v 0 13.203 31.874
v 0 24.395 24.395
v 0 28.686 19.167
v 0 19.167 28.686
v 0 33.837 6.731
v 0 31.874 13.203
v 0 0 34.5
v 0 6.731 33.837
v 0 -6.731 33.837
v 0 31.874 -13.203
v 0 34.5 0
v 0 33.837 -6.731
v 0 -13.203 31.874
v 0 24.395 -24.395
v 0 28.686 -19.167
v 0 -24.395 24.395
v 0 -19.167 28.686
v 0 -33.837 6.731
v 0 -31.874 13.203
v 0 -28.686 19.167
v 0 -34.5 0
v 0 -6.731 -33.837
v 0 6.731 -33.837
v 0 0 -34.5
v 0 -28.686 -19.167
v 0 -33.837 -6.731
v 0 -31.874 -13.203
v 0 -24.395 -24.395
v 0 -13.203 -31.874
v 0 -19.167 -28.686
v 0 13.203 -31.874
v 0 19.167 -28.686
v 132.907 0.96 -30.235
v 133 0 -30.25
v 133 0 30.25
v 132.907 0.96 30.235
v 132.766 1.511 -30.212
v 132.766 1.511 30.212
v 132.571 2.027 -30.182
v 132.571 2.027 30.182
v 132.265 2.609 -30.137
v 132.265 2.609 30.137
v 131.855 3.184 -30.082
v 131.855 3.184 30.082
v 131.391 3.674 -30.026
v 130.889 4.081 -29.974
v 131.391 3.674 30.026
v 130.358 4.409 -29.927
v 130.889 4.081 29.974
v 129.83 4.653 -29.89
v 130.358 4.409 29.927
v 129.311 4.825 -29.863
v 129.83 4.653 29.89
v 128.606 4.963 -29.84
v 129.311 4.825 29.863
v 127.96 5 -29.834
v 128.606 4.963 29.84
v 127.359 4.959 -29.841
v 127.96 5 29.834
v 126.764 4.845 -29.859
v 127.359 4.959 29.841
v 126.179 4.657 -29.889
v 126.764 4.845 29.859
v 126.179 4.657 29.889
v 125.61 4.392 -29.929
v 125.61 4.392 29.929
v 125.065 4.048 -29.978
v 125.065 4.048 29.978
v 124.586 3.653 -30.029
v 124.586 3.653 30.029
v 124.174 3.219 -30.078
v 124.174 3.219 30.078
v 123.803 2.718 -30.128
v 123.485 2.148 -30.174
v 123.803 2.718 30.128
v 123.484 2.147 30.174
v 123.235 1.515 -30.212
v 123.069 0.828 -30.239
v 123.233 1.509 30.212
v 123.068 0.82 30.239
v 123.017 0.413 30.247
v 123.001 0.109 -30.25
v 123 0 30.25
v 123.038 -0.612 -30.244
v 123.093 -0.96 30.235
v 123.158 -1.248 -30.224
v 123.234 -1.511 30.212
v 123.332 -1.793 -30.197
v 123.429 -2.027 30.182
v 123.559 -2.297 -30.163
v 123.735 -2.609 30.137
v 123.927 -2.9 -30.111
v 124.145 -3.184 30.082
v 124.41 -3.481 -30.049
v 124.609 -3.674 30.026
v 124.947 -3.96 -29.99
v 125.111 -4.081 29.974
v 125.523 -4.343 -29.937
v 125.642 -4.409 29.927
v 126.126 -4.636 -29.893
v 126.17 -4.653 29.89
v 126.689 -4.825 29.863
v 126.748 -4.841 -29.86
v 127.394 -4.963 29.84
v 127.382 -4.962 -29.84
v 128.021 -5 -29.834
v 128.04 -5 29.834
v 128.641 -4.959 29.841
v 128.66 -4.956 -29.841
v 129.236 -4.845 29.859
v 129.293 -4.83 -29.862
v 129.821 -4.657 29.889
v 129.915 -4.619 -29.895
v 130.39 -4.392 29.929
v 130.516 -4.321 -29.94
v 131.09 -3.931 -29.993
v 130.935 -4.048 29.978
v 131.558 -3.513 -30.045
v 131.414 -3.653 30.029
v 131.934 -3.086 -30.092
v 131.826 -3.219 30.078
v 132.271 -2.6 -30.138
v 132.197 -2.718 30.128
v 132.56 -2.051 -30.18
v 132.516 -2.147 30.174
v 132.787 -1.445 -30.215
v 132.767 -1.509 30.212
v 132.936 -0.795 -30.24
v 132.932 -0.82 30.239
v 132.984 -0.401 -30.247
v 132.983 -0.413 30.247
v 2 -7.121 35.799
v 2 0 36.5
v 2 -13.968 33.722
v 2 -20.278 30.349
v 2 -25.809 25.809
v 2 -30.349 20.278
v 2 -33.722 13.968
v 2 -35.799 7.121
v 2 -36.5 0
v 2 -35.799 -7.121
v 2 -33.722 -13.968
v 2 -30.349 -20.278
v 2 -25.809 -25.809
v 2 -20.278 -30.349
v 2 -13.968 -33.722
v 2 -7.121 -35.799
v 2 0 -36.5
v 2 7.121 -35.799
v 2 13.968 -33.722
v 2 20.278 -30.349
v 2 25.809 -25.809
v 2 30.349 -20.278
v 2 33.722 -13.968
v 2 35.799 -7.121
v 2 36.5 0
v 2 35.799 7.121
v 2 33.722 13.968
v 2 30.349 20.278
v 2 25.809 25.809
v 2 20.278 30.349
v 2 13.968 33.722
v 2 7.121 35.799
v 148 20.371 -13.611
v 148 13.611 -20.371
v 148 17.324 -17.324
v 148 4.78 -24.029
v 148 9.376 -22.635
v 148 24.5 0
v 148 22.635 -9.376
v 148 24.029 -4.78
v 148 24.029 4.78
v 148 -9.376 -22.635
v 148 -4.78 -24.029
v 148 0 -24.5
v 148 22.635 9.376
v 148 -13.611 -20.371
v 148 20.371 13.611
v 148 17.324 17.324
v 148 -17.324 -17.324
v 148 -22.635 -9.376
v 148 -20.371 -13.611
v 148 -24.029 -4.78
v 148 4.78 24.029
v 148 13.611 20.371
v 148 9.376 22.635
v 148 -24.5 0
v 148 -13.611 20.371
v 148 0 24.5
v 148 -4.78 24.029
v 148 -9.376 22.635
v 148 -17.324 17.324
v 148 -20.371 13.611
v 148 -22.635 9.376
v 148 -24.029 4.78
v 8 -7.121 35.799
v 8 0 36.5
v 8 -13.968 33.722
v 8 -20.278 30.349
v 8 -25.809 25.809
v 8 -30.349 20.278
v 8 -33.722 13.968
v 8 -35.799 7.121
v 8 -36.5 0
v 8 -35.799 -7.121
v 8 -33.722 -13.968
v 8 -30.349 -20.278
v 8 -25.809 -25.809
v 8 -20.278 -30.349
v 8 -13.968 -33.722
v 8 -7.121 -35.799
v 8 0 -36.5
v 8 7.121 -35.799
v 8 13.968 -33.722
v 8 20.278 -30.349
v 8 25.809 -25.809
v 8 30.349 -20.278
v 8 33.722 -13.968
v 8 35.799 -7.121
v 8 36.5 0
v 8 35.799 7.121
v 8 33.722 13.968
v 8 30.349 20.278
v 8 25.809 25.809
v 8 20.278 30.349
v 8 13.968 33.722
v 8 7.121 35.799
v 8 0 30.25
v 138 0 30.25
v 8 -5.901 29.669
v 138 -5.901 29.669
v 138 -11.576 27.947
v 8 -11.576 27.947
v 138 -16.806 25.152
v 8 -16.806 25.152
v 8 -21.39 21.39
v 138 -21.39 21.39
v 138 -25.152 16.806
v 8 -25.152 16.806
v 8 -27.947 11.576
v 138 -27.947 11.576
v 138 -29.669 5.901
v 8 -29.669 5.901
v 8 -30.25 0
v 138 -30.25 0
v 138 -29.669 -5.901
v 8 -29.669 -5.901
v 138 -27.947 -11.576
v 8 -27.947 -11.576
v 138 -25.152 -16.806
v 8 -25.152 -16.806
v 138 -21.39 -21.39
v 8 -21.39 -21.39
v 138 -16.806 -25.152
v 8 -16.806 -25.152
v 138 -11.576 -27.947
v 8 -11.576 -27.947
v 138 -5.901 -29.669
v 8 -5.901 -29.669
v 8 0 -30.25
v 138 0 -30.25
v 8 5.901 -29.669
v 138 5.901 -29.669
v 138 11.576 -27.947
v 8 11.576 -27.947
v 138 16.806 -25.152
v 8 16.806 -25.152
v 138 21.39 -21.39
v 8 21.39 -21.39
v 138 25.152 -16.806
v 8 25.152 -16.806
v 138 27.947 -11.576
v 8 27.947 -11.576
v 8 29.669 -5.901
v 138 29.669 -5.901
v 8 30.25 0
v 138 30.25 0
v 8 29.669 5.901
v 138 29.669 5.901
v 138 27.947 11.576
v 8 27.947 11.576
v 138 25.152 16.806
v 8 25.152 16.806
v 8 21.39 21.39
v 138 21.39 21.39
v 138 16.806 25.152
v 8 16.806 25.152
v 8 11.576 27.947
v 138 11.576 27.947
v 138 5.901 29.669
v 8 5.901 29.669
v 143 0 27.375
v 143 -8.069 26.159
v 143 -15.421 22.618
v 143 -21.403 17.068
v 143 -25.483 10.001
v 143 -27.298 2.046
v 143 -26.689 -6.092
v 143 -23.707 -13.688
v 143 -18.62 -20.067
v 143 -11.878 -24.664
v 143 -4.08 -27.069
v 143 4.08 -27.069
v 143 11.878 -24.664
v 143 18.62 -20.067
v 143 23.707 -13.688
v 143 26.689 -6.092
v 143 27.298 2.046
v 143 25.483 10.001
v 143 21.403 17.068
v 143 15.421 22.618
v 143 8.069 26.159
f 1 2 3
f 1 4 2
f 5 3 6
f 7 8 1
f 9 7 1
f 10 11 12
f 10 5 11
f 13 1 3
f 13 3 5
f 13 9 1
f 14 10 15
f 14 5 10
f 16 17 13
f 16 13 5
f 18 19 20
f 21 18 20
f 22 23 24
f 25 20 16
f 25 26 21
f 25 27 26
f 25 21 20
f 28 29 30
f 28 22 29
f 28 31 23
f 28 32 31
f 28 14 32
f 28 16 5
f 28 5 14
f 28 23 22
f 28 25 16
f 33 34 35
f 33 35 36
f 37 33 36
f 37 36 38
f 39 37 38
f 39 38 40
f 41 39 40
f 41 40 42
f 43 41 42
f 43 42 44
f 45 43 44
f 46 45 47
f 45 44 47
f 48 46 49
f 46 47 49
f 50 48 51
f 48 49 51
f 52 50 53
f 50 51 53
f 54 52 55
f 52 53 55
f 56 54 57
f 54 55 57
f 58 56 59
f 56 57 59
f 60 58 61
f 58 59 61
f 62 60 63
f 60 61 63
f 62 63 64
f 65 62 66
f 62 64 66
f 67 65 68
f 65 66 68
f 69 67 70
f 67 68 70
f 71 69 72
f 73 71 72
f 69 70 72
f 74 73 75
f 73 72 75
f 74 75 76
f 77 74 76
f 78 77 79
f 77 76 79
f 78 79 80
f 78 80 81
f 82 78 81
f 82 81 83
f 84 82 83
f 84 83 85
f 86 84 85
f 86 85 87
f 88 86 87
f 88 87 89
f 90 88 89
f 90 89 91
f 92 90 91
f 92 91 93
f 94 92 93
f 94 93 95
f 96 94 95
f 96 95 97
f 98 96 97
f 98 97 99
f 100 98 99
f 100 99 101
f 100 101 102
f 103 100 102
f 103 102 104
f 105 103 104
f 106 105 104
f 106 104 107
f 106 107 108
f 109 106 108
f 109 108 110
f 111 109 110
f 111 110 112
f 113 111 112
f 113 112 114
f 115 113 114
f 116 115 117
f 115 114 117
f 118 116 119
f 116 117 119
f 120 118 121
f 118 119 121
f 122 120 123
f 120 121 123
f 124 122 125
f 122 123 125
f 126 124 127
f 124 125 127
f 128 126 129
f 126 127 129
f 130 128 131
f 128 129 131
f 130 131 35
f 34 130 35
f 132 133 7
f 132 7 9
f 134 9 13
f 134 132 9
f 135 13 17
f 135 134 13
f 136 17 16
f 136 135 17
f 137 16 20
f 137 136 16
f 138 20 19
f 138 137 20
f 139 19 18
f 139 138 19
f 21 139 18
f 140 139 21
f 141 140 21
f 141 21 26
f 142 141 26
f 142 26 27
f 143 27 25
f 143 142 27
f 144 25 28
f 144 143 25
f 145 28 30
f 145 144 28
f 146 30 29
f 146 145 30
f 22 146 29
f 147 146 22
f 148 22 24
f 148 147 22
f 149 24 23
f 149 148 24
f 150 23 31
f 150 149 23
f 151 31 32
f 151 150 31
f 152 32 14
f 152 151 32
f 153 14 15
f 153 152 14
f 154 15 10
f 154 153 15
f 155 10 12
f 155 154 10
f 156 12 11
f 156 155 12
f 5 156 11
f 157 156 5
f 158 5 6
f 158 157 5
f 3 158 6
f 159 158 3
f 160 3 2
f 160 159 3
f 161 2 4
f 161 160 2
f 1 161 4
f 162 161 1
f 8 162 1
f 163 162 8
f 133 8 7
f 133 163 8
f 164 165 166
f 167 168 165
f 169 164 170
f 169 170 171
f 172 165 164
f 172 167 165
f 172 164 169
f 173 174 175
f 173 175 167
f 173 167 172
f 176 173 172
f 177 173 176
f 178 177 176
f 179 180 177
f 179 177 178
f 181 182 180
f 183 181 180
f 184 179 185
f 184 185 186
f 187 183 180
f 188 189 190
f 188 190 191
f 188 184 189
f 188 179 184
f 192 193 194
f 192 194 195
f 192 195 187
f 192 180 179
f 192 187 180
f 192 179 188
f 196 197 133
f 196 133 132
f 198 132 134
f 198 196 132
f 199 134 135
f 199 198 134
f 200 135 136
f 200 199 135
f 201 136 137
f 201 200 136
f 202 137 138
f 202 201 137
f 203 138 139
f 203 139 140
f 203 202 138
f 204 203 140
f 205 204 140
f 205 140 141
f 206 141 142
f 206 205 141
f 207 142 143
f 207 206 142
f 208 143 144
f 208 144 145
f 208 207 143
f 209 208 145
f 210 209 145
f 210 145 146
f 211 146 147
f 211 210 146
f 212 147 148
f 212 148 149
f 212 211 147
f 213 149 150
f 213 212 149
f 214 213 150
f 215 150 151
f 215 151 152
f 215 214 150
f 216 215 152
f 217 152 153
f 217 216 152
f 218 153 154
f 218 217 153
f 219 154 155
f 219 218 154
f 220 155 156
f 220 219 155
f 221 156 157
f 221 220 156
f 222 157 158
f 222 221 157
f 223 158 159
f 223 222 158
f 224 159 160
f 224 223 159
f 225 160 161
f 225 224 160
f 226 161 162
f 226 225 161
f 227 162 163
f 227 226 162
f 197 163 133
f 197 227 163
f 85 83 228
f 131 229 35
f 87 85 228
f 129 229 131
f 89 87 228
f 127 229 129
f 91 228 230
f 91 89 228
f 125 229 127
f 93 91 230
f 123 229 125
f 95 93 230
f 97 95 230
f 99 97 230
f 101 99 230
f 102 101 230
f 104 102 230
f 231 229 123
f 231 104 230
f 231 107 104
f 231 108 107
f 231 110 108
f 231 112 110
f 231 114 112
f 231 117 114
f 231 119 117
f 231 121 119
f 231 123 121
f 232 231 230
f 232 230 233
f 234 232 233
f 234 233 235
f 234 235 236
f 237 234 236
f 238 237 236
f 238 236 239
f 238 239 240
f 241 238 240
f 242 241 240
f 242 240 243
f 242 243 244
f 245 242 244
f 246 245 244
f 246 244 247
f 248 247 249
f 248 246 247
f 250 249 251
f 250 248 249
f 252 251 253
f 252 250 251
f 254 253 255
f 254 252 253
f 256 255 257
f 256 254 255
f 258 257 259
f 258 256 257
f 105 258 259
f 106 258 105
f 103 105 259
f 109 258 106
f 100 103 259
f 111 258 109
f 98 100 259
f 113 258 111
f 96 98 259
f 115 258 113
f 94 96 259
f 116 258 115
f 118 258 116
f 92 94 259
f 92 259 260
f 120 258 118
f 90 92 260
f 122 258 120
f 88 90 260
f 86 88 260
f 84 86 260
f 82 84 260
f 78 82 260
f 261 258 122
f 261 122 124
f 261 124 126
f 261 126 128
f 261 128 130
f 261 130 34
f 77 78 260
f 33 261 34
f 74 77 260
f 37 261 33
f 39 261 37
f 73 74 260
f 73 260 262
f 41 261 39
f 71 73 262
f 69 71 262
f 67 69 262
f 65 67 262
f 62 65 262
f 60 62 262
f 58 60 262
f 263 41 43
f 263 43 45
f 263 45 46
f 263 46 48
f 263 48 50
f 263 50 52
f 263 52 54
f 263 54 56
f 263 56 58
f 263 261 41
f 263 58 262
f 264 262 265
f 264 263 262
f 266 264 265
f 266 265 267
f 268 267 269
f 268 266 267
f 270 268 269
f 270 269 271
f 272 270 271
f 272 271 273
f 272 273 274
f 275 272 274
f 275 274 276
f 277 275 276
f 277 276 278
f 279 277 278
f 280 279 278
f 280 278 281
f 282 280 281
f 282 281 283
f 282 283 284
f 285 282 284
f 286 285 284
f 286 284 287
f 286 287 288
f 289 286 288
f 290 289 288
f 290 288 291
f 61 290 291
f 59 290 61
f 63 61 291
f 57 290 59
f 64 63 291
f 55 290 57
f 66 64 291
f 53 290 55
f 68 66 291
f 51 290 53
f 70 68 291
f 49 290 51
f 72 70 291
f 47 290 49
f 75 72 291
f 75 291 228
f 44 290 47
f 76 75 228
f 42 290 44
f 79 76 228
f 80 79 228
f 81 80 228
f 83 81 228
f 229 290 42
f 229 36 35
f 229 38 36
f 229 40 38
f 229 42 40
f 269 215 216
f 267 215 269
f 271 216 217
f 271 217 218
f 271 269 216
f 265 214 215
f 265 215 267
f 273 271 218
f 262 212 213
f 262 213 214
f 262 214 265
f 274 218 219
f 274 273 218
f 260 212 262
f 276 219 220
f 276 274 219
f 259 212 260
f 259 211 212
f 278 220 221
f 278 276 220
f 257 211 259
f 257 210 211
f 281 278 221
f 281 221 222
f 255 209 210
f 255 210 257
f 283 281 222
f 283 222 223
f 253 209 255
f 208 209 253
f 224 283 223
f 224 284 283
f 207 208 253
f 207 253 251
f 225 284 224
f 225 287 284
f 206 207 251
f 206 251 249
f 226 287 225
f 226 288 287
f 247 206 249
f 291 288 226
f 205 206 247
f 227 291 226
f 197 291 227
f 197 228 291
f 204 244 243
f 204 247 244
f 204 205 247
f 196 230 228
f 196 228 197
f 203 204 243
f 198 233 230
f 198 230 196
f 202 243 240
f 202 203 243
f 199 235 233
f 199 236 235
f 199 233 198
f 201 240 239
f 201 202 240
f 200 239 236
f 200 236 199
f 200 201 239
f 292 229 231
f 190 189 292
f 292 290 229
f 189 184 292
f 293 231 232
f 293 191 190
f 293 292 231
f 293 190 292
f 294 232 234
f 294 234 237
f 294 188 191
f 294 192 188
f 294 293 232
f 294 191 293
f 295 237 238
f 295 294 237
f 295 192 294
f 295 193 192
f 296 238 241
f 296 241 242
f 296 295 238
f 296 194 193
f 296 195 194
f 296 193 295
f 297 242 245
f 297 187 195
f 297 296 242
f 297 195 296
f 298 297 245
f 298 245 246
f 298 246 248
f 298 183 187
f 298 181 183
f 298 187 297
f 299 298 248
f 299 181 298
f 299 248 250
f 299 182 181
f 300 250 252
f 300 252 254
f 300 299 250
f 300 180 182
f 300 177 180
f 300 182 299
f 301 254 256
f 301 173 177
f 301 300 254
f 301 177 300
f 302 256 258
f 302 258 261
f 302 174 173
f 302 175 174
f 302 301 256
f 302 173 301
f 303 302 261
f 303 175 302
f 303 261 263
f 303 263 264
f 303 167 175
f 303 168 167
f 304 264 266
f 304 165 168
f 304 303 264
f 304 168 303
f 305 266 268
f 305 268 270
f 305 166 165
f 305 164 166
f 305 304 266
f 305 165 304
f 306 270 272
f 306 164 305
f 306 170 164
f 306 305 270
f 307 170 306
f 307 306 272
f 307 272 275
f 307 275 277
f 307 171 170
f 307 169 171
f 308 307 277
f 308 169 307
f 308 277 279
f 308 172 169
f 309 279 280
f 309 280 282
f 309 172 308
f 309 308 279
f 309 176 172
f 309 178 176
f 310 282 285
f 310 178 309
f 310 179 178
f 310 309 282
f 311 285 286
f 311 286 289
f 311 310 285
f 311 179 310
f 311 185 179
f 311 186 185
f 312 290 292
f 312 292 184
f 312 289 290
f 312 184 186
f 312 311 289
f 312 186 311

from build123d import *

# Parameters (mm, degrees)
CHAMFER_1_SIZE      = 2
SKETCH_2_R          = 5
CUT_EXTRUDE_1_DEPTH = 171.553510665


with BuildPart() as part:
    # 草图1 → 旋转1 (revolve)
    with BuildSketch(Plane.XY, mode=Mode.PRIVATE) as revolve_1_sk:
        Polygon((0, 0), (0, 36.5), (8, 36.5), (8, 30.25), (138, 30.25), (148, 24.5), (148, 0), align=None)
    revolve(revolve_1_sk.sketch.rotate(Axis((0, 0, 0), (1, 0, 0)), 90), axis=Axis((0, 0, 0), (1, 0, 0)))

    # 倒角1
    chamfer_1_edges = [part.edges().sort_by_distance(p)[0] for p in [
        (0, 0, -36.5),
    ]]
    chamfer(chamfer_1_edges, length=CHAMFER_1_SIZE)

    # 草图2 → 切除-拉伸1 (cut, through all)
    with BuildSketch(Plane.XY.offset(40)):
        with Locations((128, 0)):
            Circle(SKETCH_2_R)
    extrude(amount=-CUT_EXTRUDE_1_DEPTH, mode=Mode.SUBTRACT)


solid = part.part
